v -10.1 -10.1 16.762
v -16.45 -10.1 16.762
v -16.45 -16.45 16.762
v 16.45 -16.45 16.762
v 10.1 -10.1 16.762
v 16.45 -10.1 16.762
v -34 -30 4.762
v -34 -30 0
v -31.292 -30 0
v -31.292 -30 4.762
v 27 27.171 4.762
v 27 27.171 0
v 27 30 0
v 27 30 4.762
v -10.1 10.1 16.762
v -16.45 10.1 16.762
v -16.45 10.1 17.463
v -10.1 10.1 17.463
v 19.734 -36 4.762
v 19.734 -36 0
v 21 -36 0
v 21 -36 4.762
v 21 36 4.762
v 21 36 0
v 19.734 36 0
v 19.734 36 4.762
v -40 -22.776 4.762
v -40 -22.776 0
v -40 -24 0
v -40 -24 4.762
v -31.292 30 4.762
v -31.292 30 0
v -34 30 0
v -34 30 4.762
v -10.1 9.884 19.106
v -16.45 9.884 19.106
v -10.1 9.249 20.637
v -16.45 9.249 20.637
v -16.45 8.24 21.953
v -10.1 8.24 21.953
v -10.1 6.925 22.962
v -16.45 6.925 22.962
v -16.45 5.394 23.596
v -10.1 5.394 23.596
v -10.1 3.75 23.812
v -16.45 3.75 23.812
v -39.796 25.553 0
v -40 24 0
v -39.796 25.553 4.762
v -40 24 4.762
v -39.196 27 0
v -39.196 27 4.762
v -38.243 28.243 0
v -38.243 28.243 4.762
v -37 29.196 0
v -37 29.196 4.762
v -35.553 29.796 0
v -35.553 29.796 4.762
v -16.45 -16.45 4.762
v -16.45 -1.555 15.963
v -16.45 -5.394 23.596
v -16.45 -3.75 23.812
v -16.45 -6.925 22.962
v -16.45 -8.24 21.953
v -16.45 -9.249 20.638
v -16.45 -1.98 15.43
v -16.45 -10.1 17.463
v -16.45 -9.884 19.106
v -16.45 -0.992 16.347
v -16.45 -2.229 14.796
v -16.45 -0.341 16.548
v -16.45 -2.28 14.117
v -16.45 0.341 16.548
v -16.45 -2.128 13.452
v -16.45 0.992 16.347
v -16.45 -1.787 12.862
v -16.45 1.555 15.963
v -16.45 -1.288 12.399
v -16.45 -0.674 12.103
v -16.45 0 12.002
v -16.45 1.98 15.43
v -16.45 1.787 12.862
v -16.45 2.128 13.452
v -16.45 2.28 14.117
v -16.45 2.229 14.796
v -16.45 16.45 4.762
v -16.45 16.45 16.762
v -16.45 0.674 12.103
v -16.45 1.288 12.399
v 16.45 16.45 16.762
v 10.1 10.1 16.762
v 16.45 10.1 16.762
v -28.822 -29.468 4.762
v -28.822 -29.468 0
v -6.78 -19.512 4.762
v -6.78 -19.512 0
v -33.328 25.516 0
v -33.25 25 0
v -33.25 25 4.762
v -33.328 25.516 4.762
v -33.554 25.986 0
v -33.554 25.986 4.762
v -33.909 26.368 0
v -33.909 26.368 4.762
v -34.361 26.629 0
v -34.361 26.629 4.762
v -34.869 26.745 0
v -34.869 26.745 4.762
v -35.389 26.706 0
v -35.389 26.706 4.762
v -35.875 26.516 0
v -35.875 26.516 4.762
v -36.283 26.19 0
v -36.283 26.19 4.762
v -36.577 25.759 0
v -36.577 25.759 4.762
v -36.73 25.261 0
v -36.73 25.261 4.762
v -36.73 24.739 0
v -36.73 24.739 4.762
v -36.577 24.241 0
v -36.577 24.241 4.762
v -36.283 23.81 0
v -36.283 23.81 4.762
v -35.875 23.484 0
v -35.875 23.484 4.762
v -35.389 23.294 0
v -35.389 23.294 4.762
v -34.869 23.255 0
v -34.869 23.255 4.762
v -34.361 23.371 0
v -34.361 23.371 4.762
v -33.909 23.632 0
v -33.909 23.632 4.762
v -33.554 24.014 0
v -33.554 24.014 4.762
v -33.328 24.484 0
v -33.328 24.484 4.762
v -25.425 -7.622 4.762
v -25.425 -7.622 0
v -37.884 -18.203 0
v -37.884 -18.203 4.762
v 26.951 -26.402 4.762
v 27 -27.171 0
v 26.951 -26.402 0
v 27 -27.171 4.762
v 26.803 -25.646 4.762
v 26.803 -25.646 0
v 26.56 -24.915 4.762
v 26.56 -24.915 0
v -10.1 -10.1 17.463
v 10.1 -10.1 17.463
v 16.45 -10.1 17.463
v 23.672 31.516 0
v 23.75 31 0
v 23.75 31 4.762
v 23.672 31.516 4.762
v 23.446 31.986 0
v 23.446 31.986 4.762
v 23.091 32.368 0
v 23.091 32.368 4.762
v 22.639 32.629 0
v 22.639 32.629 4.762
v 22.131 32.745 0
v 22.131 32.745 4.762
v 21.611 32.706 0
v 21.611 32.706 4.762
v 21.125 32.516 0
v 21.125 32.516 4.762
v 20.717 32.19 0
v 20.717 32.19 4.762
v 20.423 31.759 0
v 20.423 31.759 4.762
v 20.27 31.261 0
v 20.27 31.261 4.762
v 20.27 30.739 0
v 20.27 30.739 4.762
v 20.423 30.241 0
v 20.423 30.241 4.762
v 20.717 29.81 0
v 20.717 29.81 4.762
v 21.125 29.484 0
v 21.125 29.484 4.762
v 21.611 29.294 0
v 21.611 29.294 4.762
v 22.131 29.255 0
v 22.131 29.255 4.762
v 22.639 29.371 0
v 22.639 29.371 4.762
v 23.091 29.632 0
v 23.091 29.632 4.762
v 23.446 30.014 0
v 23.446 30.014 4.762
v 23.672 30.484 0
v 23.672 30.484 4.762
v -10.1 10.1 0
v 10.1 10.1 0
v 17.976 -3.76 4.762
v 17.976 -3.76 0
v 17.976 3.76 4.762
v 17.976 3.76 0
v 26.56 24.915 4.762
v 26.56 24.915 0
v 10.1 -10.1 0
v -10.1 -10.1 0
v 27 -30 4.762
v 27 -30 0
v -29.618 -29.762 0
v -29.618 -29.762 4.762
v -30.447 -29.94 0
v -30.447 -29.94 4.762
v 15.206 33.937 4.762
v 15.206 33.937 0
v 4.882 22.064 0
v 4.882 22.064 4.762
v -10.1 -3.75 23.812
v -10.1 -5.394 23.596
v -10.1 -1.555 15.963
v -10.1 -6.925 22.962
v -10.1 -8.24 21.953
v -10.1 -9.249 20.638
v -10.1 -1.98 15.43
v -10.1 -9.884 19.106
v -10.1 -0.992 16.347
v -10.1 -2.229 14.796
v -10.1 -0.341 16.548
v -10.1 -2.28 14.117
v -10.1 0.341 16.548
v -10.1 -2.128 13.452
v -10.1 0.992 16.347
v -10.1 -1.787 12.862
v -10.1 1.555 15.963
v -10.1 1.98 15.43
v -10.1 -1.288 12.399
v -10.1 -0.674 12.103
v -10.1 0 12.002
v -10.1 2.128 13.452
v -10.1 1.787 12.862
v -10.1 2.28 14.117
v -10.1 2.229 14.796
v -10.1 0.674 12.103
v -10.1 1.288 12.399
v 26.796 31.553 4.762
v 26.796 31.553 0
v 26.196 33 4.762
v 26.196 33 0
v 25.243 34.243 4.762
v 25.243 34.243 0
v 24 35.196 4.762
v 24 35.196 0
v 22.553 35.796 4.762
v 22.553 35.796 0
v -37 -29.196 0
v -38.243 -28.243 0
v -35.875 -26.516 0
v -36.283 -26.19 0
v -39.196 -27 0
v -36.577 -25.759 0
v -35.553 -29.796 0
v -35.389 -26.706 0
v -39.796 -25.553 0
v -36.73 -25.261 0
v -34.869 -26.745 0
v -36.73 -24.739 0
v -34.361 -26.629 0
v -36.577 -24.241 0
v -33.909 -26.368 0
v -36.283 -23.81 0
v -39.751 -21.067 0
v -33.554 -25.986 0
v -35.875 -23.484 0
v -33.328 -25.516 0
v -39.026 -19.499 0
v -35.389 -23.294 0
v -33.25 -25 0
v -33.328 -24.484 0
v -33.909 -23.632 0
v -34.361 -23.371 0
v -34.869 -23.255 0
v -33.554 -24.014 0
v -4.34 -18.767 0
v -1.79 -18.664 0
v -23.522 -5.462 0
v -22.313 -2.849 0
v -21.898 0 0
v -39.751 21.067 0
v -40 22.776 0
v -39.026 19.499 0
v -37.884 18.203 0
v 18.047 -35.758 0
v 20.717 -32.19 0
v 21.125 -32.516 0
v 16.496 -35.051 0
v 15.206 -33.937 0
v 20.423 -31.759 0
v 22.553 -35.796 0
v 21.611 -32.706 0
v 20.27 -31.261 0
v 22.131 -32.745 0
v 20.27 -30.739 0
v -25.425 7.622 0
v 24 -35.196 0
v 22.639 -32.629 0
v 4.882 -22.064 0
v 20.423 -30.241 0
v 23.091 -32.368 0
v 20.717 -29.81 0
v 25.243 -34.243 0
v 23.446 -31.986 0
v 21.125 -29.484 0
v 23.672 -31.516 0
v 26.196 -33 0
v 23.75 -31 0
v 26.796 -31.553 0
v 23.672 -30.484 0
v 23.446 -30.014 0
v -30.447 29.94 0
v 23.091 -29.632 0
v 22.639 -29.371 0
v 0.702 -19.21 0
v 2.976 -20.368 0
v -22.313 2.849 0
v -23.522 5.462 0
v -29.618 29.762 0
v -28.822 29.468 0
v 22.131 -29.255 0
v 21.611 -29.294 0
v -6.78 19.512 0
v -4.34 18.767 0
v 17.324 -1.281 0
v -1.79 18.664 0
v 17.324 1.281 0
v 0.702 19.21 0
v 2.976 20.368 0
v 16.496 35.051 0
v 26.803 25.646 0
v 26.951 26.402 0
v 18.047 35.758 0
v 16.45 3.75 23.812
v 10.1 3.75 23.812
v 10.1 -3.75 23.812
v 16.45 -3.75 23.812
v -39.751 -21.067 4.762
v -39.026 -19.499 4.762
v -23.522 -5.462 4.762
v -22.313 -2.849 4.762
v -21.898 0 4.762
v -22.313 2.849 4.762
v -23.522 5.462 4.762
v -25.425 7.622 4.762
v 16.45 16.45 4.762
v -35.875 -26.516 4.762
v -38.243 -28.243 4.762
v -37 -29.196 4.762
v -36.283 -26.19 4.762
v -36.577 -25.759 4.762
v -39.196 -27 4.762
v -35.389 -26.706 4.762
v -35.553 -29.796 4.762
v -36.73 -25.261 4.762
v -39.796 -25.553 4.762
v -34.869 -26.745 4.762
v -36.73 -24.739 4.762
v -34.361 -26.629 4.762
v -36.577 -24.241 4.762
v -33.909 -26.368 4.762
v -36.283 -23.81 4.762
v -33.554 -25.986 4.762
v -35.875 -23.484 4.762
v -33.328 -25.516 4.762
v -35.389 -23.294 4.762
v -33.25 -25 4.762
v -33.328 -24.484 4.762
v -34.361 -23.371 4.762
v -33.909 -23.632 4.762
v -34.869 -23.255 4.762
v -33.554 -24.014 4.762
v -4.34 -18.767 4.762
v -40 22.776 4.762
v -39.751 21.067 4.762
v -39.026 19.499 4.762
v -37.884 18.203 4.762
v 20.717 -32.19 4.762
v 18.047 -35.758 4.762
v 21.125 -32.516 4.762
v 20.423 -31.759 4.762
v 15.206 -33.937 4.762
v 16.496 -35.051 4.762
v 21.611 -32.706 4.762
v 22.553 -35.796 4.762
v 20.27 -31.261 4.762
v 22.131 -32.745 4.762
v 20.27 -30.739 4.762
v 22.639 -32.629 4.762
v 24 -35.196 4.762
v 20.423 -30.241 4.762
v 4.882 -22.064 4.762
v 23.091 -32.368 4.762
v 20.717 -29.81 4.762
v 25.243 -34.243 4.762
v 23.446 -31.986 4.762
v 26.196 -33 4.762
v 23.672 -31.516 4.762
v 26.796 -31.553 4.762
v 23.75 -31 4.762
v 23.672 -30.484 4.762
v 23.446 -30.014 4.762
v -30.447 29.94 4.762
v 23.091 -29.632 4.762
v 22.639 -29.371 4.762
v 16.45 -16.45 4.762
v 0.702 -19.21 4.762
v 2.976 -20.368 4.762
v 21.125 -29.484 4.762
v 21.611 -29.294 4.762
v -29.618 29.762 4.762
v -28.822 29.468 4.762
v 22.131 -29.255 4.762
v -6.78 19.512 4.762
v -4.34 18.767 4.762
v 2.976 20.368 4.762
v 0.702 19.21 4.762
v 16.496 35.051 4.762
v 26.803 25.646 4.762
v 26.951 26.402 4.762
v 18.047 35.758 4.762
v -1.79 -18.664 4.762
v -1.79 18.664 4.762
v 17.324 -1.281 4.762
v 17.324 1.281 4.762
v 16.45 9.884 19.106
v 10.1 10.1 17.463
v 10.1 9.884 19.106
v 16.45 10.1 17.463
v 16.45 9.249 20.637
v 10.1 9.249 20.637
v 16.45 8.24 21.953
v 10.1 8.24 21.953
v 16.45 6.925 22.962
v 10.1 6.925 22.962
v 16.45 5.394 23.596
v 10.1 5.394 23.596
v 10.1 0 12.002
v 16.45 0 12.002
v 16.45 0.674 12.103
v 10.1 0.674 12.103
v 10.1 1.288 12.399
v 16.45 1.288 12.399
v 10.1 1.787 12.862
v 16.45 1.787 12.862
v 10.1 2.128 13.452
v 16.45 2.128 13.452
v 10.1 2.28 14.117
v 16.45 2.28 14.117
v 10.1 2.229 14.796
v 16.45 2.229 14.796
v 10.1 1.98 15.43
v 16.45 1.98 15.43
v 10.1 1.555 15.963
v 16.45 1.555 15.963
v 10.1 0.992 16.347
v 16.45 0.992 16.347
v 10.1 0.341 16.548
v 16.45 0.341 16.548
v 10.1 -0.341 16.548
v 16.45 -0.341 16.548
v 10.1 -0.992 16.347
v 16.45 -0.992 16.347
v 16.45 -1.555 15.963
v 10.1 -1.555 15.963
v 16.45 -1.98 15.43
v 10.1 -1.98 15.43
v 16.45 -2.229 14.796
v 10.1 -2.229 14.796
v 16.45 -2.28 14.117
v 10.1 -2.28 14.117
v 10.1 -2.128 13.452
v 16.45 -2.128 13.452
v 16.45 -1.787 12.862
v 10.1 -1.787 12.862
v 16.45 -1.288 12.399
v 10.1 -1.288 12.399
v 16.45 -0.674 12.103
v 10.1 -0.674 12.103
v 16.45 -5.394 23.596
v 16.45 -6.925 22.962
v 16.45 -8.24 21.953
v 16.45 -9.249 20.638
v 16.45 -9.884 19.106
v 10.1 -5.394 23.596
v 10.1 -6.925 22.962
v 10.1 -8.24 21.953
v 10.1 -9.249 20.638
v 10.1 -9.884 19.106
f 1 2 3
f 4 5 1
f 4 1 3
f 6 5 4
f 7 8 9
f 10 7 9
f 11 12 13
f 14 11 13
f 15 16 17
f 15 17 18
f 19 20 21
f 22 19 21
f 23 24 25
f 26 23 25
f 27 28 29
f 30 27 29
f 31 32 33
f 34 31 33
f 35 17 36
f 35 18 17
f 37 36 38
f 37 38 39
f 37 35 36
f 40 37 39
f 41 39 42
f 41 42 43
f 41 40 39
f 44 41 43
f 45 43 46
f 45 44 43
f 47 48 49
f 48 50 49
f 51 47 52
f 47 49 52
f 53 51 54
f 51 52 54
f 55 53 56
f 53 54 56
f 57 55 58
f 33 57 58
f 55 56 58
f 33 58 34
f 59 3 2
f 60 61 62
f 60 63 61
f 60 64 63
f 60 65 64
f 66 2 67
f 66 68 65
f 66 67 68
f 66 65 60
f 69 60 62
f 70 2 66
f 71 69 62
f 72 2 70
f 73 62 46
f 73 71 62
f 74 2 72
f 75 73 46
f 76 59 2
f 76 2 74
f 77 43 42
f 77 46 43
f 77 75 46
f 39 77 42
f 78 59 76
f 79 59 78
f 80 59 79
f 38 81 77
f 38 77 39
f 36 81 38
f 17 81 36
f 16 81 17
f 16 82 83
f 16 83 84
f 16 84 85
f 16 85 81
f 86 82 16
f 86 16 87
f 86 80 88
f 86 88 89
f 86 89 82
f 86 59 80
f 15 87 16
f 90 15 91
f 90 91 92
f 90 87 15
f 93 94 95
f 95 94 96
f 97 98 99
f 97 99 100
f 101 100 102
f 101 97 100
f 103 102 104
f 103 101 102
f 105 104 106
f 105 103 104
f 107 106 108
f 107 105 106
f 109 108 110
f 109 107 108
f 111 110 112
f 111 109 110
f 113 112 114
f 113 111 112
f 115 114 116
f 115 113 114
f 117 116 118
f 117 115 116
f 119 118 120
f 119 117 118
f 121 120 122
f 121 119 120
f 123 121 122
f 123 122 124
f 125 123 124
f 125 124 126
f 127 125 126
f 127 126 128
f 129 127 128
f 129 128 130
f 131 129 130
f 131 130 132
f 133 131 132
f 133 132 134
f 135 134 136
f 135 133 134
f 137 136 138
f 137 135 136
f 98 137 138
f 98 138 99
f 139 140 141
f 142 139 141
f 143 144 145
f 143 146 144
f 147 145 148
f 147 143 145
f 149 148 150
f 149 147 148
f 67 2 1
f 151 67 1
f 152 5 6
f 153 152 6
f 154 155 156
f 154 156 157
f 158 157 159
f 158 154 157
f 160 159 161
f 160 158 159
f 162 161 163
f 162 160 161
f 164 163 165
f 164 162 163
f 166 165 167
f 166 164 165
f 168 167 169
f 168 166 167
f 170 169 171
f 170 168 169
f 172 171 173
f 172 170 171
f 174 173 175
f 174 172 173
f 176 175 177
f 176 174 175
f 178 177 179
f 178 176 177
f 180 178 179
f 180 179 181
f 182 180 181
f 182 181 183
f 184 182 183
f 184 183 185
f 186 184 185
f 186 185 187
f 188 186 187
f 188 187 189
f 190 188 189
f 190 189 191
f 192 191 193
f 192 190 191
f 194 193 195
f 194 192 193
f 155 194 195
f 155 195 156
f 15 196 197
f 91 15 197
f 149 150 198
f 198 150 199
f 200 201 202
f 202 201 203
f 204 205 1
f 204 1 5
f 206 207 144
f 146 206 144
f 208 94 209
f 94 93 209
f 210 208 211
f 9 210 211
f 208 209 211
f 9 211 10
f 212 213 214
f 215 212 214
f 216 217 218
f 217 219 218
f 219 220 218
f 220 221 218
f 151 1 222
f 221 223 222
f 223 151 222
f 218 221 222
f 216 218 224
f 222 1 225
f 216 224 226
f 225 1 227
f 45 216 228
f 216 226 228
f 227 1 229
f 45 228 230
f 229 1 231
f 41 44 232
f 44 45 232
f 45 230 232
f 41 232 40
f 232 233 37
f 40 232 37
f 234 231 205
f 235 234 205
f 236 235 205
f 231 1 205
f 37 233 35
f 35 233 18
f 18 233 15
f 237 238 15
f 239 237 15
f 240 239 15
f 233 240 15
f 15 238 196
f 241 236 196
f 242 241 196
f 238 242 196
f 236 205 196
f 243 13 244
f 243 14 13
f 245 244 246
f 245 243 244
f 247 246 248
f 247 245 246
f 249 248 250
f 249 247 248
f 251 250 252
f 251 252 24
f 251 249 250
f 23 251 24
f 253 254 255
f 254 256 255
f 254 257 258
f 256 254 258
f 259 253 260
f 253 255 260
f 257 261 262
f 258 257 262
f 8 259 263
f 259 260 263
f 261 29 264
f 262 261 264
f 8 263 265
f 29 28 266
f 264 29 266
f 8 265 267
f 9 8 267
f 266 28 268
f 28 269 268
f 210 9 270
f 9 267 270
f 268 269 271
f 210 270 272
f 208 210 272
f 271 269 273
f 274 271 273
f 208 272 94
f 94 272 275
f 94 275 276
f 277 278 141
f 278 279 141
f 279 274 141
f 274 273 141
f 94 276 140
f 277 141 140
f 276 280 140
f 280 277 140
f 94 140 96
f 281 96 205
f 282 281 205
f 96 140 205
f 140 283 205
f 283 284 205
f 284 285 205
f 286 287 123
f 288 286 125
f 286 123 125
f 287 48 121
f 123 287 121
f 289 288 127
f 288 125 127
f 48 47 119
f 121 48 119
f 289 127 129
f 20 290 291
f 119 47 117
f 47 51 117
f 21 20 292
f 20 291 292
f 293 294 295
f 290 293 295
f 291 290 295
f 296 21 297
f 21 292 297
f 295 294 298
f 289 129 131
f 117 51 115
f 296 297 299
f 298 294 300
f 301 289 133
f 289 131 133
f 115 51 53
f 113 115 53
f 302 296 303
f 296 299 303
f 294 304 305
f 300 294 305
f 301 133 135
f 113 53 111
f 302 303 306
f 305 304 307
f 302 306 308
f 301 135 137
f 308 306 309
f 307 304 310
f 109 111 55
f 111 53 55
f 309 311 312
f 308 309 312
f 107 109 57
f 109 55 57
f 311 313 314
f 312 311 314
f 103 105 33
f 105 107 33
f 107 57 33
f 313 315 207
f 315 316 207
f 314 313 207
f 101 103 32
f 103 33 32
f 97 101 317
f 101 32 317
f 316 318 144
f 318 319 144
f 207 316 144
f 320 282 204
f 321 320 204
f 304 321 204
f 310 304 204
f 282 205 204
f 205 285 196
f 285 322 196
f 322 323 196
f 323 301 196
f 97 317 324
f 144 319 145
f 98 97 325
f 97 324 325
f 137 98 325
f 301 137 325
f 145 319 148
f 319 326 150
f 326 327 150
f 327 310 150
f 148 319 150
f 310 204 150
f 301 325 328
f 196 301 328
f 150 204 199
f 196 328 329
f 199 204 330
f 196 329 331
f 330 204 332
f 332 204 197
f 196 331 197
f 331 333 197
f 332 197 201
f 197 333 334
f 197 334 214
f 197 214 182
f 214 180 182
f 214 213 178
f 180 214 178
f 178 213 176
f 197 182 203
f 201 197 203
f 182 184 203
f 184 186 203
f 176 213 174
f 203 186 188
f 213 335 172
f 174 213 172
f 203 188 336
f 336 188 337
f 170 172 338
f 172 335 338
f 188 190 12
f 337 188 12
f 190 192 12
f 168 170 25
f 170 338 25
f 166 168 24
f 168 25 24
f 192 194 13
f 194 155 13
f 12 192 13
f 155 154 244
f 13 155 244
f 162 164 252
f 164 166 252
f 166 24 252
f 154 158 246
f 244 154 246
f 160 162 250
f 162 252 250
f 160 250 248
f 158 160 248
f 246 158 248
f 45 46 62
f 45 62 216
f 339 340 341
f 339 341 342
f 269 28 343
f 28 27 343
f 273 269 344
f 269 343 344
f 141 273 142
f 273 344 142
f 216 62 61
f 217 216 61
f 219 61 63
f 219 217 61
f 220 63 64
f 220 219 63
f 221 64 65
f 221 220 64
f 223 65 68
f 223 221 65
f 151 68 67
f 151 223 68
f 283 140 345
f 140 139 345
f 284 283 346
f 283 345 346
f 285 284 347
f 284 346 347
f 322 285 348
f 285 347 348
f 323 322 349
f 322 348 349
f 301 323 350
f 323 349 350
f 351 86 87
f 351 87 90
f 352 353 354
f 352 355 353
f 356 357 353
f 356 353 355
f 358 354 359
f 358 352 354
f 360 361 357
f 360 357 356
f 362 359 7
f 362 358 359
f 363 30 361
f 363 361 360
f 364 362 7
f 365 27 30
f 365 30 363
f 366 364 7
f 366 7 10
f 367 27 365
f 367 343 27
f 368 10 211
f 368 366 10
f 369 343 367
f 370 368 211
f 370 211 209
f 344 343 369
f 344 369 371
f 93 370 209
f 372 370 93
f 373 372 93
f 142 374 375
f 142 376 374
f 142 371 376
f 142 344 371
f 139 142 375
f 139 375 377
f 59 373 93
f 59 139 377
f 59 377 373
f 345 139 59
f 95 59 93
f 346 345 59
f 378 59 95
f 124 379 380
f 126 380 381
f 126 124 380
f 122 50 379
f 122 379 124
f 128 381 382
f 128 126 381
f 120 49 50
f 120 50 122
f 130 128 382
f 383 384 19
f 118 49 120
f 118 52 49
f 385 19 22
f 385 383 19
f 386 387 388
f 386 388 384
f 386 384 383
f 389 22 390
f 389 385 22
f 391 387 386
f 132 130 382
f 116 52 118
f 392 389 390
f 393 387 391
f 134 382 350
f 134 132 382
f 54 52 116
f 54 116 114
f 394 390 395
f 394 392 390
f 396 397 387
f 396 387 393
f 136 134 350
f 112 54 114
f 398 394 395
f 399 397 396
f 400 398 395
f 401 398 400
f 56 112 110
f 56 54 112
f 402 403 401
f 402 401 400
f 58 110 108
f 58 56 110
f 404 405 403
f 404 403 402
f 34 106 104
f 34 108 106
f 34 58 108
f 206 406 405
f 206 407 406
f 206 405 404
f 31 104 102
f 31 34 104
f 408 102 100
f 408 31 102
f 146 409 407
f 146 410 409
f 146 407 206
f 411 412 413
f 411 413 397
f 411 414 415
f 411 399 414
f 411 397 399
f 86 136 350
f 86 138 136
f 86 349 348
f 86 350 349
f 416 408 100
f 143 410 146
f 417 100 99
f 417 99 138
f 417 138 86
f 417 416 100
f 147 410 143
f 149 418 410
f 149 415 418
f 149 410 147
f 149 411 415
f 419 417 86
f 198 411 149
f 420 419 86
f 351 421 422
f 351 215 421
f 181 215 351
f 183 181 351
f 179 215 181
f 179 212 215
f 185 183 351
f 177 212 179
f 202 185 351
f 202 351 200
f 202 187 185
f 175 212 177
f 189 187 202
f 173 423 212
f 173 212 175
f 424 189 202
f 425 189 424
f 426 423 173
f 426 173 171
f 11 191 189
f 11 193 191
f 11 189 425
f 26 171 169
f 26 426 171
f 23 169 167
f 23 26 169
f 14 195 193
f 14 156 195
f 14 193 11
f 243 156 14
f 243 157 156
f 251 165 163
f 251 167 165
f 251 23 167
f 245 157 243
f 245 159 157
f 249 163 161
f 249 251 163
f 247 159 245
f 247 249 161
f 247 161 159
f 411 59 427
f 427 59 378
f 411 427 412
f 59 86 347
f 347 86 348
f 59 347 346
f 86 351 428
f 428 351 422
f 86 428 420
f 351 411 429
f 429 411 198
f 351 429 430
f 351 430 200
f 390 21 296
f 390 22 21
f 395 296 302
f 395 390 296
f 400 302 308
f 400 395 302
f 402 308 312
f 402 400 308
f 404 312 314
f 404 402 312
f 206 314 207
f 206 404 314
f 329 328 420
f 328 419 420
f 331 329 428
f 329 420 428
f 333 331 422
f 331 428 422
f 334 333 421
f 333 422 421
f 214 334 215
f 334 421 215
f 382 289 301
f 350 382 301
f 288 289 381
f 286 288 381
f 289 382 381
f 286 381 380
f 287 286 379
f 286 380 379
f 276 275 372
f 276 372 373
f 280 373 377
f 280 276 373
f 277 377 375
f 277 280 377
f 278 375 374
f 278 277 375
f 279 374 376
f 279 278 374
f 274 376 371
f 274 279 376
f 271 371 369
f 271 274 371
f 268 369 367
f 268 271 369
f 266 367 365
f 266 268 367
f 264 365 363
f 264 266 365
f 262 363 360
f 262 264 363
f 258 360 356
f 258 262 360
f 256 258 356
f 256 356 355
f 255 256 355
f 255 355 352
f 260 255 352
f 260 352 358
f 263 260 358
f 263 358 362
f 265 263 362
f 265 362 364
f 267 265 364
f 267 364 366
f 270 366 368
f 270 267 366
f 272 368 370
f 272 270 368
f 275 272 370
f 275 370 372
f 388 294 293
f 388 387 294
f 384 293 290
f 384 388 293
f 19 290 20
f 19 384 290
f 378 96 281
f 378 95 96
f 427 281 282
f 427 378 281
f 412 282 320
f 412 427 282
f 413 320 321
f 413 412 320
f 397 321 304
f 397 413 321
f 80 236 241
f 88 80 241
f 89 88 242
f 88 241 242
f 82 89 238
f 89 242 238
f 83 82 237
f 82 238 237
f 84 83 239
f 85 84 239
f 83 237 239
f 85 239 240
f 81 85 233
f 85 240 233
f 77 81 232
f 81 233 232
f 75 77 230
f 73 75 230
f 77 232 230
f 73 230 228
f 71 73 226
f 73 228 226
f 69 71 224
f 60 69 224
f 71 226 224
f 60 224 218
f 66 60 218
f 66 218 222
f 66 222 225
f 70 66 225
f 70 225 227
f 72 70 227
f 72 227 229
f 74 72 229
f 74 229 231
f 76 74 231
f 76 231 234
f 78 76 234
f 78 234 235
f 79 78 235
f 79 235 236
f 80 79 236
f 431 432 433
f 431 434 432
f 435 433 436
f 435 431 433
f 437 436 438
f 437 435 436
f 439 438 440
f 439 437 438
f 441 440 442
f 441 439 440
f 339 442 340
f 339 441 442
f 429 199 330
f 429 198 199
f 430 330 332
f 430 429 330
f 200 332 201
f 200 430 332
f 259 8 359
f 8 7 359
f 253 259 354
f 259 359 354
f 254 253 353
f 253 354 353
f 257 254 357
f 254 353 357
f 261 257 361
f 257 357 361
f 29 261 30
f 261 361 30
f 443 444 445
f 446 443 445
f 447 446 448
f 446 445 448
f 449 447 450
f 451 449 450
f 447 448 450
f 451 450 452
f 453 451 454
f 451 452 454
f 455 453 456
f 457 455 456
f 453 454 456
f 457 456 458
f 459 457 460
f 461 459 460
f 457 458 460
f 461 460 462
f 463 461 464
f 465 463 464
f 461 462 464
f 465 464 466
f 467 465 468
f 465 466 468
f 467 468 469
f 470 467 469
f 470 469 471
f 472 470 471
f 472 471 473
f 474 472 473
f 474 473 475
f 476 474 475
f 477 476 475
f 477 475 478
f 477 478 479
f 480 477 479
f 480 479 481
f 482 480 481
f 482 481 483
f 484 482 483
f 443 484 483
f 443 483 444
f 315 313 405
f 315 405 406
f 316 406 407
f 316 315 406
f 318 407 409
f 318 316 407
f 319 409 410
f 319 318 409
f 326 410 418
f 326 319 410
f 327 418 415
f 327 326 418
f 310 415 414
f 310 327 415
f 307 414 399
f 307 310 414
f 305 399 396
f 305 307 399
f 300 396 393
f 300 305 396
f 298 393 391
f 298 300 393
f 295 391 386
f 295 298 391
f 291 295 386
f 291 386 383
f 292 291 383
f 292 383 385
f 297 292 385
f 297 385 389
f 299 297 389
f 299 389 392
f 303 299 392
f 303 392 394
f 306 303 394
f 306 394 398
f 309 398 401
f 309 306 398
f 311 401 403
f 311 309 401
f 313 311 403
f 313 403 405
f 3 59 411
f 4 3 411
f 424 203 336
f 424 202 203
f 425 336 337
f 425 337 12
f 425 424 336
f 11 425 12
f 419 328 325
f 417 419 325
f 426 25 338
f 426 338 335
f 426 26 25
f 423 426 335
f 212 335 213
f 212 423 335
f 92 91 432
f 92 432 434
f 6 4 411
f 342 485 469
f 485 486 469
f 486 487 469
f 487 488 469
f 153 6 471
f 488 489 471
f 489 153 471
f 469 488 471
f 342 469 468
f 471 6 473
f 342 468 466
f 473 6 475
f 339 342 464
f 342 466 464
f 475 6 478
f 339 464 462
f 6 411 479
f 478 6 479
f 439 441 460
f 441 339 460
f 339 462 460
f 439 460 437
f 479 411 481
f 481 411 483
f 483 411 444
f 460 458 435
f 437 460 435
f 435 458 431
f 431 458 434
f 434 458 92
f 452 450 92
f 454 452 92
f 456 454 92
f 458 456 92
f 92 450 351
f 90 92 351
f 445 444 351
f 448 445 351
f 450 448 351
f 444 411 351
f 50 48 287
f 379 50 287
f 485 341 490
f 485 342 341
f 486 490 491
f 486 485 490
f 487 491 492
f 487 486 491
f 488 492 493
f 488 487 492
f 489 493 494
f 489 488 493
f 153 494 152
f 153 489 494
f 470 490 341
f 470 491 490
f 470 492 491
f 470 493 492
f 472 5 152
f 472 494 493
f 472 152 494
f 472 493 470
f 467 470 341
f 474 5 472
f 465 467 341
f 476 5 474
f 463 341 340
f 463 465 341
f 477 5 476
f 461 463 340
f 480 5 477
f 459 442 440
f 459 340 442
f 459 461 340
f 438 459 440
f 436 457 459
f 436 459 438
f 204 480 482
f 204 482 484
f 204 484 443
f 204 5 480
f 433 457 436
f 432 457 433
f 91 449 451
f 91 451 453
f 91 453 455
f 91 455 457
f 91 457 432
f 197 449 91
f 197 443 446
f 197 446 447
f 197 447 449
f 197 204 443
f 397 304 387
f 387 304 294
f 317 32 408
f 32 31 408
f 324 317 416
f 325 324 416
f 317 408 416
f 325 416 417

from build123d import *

# Parameters (mm, degrees)
SKETCH1_R           = 1.75
SKETCH1_W           = 20.2
SKETCH1_H           = 20.2
BOSS_EXTRUDE1_DEPTH = 4.7625
FILLET1_R           = 6
FILLET2_R           = 10
SKETCH2_W           = 6.35
SKETCH2_H           = 20.2
BOSS_EXTRUDE2_DEPTH = 19.05
SKETCH3_R           = 2.286
CUT_EXTRUDE1_DEPTH  = 57.45
SKETCH4_W           = 32.9
SKETCH4_H           = 6.35
BOSS_EXTRUDE3_DEPTH = 12
FILLET5_R           = 6.35


with BuildPart() as part:
    # Sketch1 → Boss-Extrude1 (new body)
    with BuildSketch(Plane.XY):
        Polygon((-30, -30), (0, -16.45), (17, -36), (27, -36), (27, -26), (16.45, 0), (27, 26), (27, 36), (17, 36), (0, 16.45), (-30, 30), (-40, 30), (-40, 20), (-16.45, 0), (-40, -20), (-40, -30), align=None)
        with Locations((22, 31)):
            Circle(SKETCH1_R, mode=Mode.SUBTRACT)
        with Locations((22, -31)):
            Circle(SKETCH1_R, mode=Mode.SUBTRACT)
        with Locations((-35, 25)):
            Circle(SKETCH1_R, mode=Mode.SUBTRACT)
        with Locations((-35, -25)):
            Circle(SKETCH1_R, mode=Mode.SUBTRACT)
        Rectangle(SKETCH1_W, SKETCH1_H, mode=Mode.SUBTRACT)
    extrude(amount=BOSS_EXTRUDE1_DEPTH)

    # Fillet1
    fillet1_edges = [part.edges().sort_by_distance(p)[0] for p in [
        (17, 36, 2.38125),
        (27, 36, 2.38125),
        (27, 26, 2.38125),
        (27, -26, 2.38125),
        (27, -36, 2.38125),
        (17, -36, 2.38125),
        (-30, -30, 2.38125),
        (-40, -30, 2.38125),
        (-40, -20, 2.38125),
        (-40, 20, 2.38125),
        (-40, 30, 2.38125),
        (-30, 30, 2.38125),
    ]]
    fillet(fillet1_edges, radius=FILLET1_R)

    # Fillet2
    fillet2_edges = [part.edges().sort_by_distance(p)[0] for p in [
        (0, 16.45, 2.38125),
        (16.45, 0, 2.38125),
        (0, -16.45, 2.38125),
        (-16.45, 0, 2.38125),
    ]]
    fillet(fillet2_edges, radius=FILLET2_R)

    # Sketch2 → Boss-Extrude2 (add)
    with BuildSketch(Plane.XY.offset(4.7625)):
        with Locations((13.275, 0)):
            Rectangle(SKETCH2_W, SKETCH2_H)
        with Locations((-13.275, 0)):
            Rectangle(SKETCH2_W, SKETCH2_H)
    extrude(amount=BOSS_EXTRUDE2_DEPTH)

    # Sketch3 → Cut-Extrude1 (cut, through all)
    with BuildSketch(Plane(origin=(16.45, 0, 0), x_dir=(0, 0, -1), z_dir=(1, 0, 0))):
        with Locations((-14.2875, 0)):
            Circle(SKETCH3_R)
    extrude(amount=-CUT_EXTRUDE1_DEPTH, mode=Mode.SUBTRACT)

    # Sketch4 → Boss-Extrude3 (add)
    with BuildSketch(Plane.XY.offset(4.7625)):
        with Locations((0, 13.275)):
            Rectangle(SKETCH4_W, SKETCH4_H)
        with Locations((0, -13.275)):
            Rectangle(SKETCH4_W, SKETCH4_H)
    extrude(amount=BOSS_EXTRUDE3_DEPTH)

    # Fillet5
    fillet5_edges = [part.edges().sort_by_distance(p)[0] for p in [
        (13.275, -10.1, 23.8125),
        (13.275, 10.1, 23.8125),
        (-13.275, 10.1, 23.8125),
        (-13.275, -10.1, 23.8125),
    ]]
    fillet(fillet5_edges, radius=FILLET5_R)


solid = part.part
